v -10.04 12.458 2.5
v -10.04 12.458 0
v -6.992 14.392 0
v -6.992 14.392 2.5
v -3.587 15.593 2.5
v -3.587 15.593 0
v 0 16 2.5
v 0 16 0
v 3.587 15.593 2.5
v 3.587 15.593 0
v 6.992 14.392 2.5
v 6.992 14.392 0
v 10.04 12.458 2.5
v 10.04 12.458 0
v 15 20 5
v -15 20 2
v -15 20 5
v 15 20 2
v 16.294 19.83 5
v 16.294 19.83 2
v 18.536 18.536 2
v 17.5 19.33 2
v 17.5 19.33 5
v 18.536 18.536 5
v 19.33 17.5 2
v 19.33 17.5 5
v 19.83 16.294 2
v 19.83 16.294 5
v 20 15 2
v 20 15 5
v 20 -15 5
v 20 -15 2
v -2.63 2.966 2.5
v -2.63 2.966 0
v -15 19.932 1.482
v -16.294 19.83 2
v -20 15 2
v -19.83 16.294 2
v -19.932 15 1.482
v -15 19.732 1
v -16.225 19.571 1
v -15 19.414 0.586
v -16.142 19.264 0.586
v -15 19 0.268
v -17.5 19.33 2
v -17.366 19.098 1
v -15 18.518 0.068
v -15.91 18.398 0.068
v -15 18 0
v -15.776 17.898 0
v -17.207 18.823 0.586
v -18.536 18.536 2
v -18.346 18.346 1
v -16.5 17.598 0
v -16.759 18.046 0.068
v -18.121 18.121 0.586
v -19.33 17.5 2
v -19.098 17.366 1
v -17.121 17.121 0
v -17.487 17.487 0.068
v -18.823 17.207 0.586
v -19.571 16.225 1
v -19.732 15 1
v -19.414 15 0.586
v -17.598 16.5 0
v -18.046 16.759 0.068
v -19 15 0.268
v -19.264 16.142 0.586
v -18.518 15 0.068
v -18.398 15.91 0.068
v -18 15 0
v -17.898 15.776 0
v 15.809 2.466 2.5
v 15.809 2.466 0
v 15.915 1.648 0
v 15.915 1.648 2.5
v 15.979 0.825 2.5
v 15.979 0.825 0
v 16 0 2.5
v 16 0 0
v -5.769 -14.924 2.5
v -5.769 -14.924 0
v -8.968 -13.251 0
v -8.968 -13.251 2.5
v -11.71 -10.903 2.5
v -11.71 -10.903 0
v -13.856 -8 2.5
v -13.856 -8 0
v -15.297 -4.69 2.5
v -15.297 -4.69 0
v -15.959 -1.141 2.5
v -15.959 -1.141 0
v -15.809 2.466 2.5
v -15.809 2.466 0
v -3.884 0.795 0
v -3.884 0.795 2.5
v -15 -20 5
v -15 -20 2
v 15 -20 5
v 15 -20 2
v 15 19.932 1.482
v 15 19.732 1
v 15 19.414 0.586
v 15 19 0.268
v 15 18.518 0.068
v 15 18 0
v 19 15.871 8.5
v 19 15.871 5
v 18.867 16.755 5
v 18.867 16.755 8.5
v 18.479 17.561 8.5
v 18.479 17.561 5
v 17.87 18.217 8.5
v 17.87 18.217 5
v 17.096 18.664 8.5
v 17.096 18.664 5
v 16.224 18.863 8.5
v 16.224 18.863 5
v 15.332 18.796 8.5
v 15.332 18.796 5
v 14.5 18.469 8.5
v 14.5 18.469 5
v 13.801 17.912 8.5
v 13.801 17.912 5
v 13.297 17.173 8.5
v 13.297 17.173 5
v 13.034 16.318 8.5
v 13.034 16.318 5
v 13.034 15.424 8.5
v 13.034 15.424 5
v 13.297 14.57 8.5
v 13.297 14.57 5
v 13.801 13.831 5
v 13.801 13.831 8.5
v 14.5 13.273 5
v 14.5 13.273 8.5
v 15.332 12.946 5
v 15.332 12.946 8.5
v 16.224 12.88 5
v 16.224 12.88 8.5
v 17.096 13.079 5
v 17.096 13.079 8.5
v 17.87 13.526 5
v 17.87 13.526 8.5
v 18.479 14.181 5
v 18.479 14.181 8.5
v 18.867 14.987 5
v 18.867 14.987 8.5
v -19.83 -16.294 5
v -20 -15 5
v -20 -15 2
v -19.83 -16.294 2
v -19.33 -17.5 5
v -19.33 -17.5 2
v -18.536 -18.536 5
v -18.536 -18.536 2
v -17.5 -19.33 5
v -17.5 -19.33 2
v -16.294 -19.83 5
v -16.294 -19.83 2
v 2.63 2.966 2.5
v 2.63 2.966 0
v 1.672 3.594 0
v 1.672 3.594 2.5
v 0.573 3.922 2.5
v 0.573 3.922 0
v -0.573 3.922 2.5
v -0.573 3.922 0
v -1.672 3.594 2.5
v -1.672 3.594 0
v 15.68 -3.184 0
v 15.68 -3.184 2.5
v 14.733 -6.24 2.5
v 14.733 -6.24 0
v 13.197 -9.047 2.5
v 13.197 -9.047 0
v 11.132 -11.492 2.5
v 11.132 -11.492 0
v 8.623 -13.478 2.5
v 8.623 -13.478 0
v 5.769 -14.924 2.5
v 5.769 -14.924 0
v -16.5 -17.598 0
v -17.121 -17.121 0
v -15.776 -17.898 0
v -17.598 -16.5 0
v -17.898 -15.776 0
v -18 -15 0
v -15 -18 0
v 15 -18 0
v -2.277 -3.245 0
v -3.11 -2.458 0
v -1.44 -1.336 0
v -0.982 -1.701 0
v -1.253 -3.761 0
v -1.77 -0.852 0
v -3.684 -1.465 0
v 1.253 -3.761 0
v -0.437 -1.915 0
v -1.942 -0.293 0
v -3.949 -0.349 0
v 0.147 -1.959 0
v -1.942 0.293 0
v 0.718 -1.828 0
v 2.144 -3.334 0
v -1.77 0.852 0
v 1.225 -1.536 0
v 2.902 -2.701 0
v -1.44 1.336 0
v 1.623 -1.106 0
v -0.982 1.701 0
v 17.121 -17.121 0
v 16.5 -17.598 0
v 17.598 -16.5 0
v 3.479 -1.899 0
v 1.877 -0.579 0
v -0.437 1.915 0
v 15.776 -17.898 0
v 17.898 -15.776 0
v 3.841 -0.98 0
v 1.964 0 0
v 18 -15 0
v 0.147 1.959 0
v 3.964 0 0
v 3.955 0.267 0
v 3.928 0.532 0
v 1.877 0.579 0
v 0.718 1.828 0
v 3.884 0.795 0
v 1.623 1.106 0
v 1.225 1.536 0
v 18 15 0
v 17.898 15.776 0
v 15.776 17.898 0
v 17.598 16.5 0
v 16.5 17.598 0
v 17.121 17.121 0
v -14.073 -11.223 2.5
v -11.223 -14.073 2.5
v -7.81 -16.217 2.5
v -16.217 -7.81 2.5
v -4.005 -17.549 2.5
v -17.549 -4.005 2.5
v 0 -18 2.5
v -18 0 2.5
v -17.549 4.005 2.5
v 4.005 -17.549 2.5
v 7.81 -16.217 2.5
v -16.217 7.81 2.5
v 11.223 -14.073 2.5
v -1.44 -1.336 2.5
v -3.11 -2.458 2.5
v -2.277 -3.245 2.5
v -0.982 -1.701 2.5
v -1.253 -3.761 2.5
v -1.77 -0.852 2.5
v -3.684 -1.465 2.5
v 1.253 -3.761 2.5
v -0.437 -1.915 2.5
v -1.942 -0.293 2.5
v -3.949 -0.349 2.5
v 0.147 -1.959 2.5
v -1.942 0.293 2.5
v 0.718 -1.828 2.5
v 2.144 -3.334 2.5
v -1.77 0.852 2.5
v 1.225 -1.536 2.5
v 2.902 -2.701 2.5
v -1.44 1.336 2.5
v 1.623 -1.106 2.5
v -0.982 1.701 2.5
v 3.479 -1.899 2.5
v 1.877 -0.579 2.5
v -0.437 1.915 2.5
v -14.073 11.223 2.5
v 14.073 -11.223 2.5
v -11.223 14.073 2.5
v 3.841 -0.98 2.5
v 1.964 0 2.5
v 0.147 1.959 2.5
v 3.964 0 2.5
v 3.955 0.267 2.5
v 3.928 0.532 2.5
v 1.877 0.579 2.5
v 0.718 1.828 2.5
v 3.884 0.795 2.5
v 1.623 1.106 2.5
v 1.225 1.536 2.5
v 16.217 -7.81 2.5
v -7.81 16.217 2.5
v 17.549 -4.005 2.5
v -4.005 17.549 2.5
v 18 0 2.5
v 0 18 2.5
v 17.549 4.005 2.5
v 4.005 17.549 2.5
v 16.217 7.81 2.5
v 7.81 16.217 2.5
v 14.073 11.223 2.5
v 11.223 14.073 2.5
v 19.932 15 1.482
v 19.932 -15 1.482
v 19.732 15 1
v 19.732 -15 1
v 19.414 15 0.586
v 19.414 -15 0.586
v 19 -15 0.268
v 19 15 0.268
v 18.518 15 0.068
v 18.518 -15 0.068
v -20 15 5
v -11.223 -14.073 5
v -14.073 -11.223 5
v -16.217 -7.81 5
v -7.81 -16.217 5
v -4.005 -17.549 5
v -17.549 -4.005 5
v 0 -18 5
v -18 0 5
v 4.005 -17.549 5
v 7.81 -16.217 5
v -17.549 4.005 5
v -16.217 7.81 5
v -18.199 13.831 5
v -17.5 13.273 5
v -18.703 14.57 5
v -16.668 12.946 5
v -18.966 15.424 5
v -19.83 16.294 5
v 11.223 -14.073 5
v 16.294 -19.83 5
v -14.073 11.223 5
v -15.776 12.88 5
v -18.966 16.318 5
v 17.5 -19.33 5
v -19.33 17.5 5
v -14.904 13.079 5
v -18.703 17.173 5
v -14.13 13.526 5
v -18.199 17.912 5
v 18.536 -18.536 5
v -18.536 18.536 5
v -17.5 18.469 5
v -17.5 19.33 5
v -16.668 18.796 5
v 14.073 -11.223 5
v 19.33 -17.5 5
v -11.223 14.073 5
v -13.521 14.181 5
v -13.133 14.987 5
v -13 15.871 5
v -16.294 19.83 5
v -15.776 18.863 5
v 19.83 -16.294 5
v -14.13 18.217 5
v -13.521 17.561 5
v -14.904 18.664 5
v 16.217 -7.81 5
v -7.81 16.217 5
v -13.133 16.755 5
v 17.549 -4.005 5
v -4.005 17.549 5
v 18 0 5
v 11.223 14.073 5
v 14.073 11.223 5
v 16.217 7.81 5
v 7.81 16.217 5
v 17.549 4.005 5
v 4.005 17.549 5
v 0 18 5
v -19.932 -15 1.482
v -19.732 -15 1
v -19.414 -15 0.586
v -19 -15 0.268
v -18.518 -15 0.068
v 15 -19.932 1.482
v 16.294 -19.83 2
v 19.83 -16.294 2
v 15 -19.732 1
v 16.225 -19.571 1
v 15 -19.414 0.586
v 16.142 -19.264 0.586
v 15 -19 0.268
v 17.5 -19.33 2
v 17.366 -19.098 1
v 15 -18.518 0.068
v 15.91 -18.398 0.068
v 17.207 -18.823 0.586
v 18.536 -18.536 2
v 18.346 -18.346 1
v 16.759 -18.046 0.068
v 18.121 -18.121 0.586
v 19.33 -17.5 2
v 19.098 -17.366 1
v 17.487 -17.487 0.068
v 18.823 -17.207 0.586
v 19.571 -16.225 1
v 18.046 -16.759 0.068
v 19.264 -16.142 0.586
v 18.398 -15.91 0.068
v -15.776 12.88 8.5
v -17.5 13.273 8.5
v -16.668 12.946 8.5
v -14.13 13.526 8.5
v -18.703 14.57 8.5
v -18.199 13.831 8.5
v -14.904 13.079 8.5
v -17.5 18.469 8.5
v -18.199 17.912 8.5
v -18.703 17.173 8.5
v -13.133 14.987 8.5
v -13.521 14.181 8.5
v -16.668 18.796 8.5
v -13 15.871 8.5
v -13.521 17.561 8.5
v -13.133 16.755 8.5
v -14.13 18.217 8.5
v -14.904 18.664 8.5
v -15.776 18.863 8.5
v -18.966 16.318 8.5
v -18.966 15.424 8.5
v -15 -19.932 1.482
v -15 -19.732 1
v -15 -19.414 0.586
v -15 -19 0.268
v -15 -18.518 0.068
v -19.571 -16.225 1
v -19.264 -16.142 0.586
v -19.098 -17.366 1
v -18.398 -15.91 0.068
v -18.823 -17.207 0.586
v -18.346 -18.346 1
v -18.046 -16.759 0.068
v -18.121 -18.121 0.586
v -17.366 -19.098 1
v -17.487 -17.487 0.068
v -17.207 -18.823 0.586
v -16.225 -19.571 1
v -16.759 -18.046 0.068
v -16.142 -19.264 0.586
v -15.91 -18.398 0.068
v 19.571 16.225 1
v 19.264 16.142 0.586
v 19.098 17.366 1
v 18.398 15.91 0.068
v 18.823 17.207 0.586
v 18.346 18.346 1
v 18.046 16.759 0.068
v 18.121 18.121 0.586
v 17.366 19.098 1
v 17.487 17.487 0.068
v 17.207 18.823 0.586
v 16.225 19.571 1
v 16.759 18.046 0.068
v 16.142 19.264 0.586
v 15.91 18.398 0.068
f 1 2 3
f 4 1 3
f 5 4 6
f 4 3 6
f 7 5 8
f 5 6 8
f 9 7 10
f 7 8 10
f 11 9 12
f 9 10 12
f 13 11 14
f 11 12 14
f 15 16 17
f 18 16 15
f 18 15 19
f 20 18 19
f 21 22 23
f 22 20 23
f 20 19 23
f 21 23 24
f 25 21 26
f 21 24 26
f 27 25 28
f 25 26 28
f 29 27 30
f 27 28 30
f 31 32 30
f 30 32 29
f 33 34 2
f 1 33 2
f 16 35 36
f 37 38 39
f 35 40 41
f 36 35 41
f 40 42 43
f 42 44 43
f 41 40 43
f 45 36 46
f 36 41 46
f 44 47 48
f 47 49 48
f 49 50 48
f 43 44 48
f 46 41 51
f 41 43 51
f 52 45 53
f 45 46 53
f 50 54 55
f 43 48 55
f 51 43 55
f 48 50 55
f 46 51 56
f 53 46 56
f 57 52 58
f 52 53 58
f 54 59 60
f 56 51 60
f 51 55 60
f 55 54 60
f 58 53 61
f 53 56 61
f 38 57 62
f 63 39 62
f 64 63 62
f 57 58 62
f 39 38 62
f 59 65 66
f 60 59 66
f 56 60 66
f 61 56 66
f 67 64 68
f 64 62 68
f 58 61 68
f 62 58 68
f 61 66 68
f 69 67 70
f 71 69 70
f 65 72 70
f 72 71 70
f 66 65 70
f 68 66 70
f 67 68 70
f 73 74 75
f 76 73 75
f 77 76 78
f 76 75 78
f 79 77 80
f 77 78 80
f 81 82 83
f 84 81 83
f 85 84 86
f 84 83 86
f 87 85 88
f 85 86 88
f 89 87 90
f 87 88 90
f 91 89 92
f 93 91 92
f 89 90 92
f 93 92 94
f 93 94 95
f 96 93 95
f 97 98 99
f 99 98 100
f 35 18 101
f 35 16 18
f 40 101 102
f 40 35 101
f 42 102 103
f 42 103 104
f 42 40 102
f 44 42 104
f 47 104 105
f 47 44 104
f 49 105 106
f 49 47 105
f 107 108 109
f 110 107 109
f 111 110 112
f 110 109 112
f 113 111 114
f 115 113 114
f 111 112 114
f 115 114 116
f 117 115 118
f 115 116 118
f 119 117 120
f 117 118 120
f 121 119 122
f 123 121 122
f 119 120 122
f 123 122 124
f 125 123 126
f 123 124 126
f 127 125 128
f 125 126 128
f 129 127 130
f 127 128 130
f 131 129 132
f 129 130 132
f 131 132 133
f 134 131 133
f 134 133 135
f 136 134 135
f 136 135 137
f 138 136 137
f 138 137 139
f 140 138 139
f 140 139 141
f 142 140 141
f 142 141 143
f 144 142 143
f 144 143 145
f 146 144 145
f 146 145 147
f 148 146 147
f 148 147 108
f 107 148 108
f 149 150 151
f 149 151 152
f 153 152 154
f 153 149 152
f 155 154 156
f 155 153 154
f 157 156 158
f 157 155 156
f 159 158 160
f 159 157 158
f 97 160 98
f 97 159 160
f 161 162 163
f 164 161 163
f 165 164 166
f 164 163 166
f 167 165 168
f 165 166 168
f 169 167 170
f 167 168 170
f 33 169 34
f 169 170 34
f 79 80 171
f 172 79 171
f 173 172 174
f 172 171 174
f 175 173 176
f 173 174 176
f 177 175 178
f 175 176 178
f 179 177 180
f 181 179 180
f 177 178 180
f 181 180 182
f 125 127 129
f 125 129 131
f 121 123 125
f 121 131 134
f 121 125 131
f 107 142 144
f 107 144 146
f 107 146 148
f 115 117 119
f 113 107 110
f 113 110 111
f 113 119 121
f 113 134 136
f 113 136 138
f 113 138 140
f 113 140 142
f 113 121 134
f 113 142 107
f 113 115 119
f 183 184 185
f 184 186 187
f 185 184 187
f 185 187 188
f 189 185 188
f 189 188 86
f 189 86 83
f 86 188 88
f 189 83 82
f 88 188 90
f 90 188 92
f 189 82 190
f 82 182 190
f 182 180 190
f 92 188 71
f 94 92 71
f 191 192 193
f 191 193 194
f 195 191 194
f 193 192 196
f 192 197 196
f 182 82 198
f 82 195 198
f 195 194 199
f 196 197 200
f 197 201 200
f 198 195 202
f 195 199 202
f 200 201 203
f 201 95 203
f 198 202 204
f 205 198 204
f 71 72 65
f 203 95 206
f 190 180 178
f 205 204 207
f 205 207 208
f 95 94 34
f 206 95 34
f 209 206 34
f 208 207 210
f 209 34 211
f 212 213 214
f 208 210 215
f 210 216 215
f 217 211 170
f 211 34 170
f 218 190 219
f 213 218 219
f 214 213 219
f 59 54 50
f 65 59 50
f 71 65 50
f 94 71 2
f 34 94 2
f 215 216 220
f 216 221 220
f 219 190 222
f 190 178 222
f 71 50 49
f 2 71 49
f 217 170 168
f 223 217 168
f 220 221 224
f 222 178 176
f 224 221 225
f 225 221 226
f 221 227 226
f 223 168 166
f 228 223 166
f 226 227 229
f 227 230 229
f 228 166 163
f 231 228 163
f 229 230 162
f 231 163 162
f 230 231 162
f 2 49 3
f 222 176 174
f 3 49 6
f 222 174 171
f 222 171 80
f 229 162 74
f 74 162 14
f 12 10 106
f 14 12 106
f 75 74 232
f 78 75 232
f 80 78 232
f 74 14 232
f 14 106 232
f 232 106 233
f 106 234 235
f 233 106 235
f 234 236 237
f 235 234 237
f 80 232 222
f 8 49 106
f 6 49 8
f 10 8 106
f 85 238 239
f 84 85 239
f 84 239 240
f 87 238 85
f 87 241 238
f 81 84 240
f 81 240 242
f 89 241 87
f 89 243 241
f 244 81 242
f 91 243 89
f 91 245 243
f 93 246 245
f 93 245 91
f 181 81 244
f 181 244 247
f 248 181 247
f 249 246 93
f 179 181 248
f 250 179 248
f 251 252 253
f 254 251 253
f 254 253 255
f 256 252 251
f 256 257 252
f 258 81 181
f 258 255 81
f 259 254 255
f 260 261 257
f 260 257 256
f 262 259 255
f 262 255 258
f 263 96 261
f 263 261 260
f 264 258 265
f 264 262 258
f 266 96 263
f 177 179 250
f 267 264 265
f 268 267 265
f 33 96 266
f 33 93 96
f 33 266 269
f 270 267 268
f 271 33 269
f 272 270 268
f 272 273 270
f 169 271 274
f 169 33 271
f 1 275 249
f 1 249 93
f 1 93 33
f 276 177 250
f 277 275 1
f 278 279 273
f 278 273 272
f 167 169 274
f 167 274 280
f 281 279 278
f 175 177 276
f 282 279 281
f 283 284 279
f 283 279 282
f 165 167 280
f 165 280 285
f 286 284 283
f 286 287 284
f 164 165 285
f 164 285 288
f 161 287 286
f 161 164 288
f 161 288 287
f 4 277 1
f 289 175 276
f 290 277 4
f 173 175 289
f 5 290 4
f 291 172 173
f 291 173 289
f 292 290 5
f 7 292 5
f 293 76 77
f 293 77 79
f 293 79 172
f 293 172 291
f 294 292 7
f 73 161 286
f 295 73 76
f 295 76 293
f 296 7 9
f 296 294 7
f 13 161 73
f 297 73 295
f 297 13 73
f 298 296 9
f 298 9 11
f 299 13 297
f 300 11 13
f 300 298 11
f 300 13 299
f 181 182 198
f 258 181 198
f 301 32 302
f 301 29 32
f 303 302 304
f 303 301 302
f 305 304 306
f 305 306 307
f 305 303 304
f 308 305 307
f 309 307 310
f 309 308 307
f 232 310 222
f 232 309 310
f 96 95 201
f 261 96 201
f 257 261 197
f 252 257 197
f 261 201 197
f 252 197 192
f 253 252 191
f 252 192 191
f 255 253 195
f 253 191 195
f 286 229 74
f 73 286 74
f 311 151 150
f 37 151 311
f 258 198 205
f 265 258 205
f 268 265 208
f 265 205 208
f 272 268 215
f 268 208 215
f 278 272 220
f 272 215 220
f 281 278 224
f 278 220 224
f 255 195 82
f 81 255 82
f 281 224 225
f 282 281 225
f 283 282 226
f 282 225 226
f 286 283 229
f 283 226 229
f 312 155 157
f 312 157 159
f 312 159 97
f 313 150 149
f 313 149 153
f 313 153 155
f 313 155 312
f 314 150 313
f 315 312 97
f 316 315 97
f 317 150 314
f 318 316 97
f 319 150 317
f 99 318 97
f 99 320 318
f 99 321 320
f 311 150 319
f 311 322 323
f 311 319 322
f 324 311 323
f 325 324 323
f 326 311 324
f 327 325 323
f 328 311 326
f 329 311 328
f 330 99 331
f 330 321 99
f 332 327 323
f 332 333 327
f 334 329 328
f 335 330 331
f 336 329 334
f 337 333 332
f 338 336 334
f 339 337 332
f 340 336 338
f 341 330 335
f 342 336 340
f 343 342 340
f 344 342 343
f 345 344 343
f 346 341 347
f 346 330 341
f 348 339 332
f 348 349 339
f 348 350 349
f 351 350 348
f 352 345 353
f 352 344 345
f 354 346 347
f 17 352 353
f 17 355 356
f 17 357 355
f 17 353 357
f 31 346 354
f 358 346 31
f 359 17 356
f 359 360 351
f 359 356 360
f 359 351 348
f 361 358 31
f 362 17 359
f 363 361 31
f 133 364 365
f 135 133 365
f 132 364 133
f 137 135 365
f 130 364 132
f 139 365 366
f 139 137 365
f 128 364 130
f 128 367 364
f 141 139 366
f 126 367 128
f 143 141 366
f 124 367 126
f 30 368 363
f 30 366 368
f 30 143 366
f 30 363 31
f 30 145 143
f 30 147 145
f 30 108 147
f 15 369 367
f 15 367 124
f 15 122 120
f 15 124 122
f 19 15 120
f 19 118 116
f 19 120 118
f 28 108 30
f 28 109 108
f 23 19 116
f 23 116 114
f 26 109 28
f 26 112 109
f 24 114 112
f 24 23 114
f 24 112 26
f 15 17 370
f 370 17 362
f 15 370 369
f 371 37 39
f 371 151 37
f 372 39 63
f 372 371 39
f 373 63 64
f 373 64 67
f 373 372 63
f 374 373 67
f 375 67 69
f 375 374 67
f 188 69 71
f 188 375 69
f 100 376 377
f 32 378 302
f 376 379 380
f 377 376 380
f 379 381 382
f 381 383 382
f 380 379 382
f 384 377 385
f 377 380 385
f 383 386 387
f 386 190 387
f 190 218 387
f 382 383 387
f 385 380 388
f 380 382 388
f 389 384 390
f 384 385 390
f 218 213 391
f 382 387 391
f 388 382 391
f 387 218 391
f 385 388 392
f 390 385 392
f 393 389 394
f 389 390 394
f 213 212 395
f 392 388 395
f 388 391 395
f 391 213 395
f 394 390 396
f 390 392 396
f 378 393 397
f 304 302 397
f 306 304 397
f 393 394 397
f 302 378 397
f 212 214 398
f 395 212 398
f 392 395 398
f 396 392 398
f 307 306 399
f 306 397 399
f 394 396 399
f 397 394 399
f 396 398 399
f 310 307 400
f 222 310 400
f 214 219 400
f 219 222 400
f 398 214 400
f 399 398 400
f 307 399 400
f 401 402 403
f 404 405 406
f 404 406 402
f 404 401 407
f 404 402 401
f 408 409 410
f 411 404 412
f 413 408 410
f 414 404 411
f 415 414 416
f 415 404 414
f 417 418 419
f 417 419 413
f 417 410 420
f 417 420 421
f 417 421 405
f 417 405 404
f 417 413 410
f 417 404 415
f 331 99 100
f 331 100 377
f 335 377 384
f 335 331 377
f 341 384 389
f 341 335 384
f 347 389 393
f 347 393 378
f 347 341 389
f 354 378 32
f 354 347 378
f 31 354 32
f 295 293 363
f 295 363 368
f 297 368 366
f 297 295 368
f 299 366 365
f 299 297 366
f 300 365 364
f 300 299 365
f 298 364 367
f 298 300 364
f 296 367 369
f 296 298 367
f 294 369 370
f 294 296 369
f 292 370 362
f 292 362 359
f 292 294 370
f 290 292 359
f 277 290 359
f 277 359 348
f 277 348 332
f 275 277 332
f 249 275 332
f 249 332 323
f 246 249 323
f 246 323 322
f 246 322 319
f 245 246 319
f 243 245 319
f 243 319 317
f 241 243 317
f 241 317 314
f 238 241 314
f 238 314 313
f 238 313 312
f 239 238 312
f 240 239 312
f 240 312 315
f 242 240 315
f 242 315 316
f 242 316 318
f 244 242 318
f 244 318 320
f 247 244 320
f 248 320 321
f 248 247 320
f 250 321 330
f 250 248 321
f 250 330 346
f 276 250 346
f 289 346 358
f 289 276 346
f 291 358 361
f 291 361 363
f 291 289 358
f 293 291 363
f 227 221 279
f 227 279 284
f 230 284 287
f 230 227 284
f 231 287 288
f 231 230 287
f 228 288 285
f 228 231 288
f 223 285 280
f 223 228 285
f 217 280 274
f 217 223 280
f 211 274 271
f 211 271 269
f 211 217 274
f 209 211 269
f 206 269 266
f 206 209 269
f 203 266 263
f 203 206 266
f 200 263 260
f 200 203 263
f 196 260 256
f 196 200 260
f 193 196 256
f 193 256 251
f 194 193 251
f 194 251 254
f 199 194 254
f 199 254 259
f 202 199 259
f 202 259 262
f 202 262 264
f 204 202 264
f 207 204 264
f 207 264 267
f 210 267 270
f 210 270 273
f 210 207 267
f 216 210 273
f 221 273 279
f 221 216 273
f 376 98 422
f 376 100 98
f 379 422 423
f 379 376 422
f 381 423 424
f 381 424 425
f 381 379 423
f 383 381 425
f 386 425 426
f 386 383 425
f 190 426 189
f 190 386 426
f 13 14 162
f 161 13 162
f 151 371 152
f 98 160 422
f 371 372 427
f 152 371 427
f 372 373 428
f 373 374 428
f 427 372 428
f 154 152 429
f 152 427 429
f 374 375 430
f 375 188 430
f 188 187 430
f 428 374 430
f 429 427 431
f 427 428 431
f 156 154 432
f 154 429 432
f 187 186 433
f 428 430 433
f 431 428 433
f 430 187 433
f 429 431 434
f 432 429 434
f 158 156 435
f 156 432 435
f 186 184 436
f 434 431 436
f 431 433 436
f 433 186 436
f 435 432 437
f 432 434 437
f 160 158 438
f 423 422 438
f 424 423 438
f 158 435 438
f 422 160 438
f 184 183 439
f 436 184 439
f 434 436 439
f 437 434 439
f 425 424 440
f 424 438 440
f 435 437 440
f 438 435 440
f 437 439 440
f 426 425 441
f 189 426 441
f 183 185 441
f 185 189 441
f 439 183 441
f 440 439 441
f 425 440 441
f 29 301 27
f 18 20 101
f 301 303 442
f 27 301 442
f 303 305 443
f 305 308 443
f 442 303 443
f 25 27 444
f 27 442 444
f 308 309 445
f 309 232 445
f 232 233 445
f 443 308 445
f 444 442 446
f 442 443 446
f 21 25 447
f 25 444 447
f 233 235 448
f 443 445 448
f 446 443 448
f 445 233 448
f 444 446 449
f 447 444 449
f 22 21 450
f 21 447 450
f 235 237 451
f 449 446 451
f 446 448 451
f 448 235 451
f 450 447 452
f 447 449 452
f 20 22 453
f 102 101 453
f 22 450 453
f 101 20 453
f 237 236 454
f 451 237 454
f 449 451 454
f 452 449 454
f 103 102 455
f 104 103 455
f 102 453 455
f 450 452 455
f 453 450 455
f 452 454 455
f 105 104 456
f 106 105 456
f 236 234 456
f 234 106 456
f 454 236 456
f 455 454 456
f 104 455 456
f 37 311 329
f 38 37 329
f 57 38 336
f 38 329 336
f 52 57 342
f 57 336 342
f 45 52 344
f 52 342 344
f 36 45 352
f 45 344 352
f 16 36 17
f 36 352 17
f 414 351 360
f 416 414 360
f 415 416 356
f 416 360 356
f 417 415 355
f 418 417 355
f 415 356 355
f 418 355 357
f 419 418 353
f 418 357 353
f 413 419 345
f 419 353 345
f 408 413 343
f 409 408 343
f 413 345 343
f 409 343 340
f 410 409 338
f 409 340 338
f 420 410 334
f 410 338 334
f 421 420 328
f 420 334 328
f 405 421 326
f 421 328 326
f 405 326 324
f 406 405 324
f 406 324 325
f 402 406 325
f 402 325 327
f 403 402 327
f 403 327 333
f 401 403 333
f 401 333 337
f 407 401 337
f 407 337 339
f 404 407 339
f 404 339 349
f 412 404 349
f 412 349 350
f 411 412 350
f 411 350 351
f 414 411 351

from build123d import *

# Parameters (mm, degrees)
F0_W     = 40
F0_H     = 40
F0_R     = 3
F0_R_2   = 18
F1_DEPTH = 5
F2_DEPTH = 8.5
F3_R     = 5
F4_R     = 1.99999
F0_R_3   = 1.96412235
F5_DEPTH = 2.5


# Not quite as in the source:
# - a fillet or chamfer is up to 0.001 mm smaller than in the source, because OpenCascade refuses the exact size


with BuildPart() as f1:
    # F0 (on Top) → F1 (new body)
    with BuildSketch(Plane.XY):
        Rectangle(F0_W, F0_H)
        with Locations((-16, 15.8712012513)):
            Circle(F0_R, mode=Mode.SUBTRACT)
        Circle(F0_R_2, mode=Mode.SUBTRACT)
        with Locations((16, 15.8712012513)):
            Circle(F0_R, mode=Mode.SUBTRACT)
    extrude(amount=F1_DEPTH)

    # F0 (on Top) → F2 (join)
    with BuildSketch(Plane.XY):
        with Locations((-16, 15.8712012513)):
            Circle(F0_R)
        with Locations((16, 15.8712012513)):
            Circle(F0_R)
    extrude(amount=F2_DEPTH)

    # F3
    f3_edges = [f1.edges().sort_by_distance(p)[0] for p in [
        (-20, -20, 2.5),
        (-20, 20, 2.5),
        (20, -20, 2.5),
        (20, 20, 2.5),
    ]]
    fillet(f3_edges, radius=F3_R)

    # F4 (radius 2 in the source; OpenCascade refuses exactly that, so slightly less here)
    f4_edges = [f1.edges().sort_by_distance(p)[0] for p in [
        (20, 0, 0),
    ]]
    fillet(f4_edges, radius=F4_R)

    # F0 (on Top) → F5 (join)
    with BuildSketch(Plane.XY):
        Circle(F0_R_2)
        with BuildLine():
            ThreePointArc((15.8087915907, 2.4661931072), (15.952126276, 1.236797184), (16, 0))
            ThreePointArc((16, 0), (13.1965480074, -9.0471609187), (5.7686099139, -14.9239116743))
            ThreePointArc((5.7686099139, -14.9239116743), (0, -16), (-5.7686099139, -14.9239116743))
            ThreePointArc((-5.7686099139, -14.9239116743), (-13.8564064606, -8), (-15.8087915907, 2.4661931072))
            ThreePointArc((-15.8087915907, 2.4661931072), (-13.8564064606, 8), (-10.0401816768, 12.4577185671))
            ThreePointArc((-10.0401816768, 12.4577185671), (0, 16), (10.0401816768, 12.4577185671))
            ThreePointArc((10.0401816768, 12.4577185671), (13.8564064606, 8), (15.8087915907, 2.4661931072))
        make_face(mode=Mode.SUBTRACT)
        with BuildLine():
            ThreePointArc((3.96412235, 0), (3.9439266403, 0.3996356611), (3.8835452903, 0.795199336))
            ThreePointArc((3.8835452903, 0.795199336), (3.4330306588, 1.982061175), (2.6304354712, 2.9656492102))
            ThreePointArc((2.6304354712, 2.9656492102), (0, 3.96412235), (-2.6304354712, 2.9656492102))
            ThreePointArc((-2.6304354712, 2.9656492102), (-3.4330306588, 1.982061175), (-3.8835452903, 0.795199336))
            ThreePointArc((-3.8835452903, 0.795199336), (-3.4330306588, -1.982061175), (-1.2531098191, -3.7608485461))
            ThreePointArc((-1.2531098191, -3.7608485461), (0, -3.96412235), (1.2531098191, -3.7608485461))
            ThreePointArc((1.2531098191, -3.7608485461), (3.2157228306, -2.3180579549), (3.96412235, 0))
        make_face()
        Circle(F0_R_3, mode=Mode.SUBTRACT)
        with BuildLine():
            ThreePointArc((-5.7686099139, -14.9239116743), (0, -16), (5.7686099139, -14.9239116743))
            Line((5.7686099139, -14.9239116743), (1.2531098191, -3.7608485461))
            ThreePointArc((1.2531098191, -3.7608485461), (0, -3.96412235), (-1.2531098191, -3.7608485461))
            Line((-1.2531098191, -3.7608485461), (-5.7686099139, -14.9239116743))
        make_face()
        with BuildLine():
            Line((3.8835452903, 0.795199336), (15.8087915907, 2.4661931072))
            ThreePointArc((15.8087915907, 2.4661931072), (13.8564064606, 8), (10.0401816768, 12.4577185671))
            Line((10.0401816768, 12.4577185671), (2.6304354712, 2.9656492102))
            ThreePointArc((2.6304354712, 2.9656492102), (3.4330306588, 1.982061175), (3.8835452903, 0.795199336))
        make_face()
        with BuildLine():
            Line((-2.6304354712, 2.9656492102), (-10.0401816768, 12.4577185671))
            ThreePointArc((-10.0401816768, 12.4577185671), (-13.8564064606, 8), (-15.8087915907, 2.4661931072))
            Line((-15.8087915907, 2.4661931072), (-3.8835452903, 0.795199336))
            ThreePointArc((-3.8835452903, 0.795199336), (-3.4330306588, 1.982061175), (-2.6304354712, 2.9656492102))
        make_face()
    extrude(amount=F5_DEPTH)


solid = f1.part
